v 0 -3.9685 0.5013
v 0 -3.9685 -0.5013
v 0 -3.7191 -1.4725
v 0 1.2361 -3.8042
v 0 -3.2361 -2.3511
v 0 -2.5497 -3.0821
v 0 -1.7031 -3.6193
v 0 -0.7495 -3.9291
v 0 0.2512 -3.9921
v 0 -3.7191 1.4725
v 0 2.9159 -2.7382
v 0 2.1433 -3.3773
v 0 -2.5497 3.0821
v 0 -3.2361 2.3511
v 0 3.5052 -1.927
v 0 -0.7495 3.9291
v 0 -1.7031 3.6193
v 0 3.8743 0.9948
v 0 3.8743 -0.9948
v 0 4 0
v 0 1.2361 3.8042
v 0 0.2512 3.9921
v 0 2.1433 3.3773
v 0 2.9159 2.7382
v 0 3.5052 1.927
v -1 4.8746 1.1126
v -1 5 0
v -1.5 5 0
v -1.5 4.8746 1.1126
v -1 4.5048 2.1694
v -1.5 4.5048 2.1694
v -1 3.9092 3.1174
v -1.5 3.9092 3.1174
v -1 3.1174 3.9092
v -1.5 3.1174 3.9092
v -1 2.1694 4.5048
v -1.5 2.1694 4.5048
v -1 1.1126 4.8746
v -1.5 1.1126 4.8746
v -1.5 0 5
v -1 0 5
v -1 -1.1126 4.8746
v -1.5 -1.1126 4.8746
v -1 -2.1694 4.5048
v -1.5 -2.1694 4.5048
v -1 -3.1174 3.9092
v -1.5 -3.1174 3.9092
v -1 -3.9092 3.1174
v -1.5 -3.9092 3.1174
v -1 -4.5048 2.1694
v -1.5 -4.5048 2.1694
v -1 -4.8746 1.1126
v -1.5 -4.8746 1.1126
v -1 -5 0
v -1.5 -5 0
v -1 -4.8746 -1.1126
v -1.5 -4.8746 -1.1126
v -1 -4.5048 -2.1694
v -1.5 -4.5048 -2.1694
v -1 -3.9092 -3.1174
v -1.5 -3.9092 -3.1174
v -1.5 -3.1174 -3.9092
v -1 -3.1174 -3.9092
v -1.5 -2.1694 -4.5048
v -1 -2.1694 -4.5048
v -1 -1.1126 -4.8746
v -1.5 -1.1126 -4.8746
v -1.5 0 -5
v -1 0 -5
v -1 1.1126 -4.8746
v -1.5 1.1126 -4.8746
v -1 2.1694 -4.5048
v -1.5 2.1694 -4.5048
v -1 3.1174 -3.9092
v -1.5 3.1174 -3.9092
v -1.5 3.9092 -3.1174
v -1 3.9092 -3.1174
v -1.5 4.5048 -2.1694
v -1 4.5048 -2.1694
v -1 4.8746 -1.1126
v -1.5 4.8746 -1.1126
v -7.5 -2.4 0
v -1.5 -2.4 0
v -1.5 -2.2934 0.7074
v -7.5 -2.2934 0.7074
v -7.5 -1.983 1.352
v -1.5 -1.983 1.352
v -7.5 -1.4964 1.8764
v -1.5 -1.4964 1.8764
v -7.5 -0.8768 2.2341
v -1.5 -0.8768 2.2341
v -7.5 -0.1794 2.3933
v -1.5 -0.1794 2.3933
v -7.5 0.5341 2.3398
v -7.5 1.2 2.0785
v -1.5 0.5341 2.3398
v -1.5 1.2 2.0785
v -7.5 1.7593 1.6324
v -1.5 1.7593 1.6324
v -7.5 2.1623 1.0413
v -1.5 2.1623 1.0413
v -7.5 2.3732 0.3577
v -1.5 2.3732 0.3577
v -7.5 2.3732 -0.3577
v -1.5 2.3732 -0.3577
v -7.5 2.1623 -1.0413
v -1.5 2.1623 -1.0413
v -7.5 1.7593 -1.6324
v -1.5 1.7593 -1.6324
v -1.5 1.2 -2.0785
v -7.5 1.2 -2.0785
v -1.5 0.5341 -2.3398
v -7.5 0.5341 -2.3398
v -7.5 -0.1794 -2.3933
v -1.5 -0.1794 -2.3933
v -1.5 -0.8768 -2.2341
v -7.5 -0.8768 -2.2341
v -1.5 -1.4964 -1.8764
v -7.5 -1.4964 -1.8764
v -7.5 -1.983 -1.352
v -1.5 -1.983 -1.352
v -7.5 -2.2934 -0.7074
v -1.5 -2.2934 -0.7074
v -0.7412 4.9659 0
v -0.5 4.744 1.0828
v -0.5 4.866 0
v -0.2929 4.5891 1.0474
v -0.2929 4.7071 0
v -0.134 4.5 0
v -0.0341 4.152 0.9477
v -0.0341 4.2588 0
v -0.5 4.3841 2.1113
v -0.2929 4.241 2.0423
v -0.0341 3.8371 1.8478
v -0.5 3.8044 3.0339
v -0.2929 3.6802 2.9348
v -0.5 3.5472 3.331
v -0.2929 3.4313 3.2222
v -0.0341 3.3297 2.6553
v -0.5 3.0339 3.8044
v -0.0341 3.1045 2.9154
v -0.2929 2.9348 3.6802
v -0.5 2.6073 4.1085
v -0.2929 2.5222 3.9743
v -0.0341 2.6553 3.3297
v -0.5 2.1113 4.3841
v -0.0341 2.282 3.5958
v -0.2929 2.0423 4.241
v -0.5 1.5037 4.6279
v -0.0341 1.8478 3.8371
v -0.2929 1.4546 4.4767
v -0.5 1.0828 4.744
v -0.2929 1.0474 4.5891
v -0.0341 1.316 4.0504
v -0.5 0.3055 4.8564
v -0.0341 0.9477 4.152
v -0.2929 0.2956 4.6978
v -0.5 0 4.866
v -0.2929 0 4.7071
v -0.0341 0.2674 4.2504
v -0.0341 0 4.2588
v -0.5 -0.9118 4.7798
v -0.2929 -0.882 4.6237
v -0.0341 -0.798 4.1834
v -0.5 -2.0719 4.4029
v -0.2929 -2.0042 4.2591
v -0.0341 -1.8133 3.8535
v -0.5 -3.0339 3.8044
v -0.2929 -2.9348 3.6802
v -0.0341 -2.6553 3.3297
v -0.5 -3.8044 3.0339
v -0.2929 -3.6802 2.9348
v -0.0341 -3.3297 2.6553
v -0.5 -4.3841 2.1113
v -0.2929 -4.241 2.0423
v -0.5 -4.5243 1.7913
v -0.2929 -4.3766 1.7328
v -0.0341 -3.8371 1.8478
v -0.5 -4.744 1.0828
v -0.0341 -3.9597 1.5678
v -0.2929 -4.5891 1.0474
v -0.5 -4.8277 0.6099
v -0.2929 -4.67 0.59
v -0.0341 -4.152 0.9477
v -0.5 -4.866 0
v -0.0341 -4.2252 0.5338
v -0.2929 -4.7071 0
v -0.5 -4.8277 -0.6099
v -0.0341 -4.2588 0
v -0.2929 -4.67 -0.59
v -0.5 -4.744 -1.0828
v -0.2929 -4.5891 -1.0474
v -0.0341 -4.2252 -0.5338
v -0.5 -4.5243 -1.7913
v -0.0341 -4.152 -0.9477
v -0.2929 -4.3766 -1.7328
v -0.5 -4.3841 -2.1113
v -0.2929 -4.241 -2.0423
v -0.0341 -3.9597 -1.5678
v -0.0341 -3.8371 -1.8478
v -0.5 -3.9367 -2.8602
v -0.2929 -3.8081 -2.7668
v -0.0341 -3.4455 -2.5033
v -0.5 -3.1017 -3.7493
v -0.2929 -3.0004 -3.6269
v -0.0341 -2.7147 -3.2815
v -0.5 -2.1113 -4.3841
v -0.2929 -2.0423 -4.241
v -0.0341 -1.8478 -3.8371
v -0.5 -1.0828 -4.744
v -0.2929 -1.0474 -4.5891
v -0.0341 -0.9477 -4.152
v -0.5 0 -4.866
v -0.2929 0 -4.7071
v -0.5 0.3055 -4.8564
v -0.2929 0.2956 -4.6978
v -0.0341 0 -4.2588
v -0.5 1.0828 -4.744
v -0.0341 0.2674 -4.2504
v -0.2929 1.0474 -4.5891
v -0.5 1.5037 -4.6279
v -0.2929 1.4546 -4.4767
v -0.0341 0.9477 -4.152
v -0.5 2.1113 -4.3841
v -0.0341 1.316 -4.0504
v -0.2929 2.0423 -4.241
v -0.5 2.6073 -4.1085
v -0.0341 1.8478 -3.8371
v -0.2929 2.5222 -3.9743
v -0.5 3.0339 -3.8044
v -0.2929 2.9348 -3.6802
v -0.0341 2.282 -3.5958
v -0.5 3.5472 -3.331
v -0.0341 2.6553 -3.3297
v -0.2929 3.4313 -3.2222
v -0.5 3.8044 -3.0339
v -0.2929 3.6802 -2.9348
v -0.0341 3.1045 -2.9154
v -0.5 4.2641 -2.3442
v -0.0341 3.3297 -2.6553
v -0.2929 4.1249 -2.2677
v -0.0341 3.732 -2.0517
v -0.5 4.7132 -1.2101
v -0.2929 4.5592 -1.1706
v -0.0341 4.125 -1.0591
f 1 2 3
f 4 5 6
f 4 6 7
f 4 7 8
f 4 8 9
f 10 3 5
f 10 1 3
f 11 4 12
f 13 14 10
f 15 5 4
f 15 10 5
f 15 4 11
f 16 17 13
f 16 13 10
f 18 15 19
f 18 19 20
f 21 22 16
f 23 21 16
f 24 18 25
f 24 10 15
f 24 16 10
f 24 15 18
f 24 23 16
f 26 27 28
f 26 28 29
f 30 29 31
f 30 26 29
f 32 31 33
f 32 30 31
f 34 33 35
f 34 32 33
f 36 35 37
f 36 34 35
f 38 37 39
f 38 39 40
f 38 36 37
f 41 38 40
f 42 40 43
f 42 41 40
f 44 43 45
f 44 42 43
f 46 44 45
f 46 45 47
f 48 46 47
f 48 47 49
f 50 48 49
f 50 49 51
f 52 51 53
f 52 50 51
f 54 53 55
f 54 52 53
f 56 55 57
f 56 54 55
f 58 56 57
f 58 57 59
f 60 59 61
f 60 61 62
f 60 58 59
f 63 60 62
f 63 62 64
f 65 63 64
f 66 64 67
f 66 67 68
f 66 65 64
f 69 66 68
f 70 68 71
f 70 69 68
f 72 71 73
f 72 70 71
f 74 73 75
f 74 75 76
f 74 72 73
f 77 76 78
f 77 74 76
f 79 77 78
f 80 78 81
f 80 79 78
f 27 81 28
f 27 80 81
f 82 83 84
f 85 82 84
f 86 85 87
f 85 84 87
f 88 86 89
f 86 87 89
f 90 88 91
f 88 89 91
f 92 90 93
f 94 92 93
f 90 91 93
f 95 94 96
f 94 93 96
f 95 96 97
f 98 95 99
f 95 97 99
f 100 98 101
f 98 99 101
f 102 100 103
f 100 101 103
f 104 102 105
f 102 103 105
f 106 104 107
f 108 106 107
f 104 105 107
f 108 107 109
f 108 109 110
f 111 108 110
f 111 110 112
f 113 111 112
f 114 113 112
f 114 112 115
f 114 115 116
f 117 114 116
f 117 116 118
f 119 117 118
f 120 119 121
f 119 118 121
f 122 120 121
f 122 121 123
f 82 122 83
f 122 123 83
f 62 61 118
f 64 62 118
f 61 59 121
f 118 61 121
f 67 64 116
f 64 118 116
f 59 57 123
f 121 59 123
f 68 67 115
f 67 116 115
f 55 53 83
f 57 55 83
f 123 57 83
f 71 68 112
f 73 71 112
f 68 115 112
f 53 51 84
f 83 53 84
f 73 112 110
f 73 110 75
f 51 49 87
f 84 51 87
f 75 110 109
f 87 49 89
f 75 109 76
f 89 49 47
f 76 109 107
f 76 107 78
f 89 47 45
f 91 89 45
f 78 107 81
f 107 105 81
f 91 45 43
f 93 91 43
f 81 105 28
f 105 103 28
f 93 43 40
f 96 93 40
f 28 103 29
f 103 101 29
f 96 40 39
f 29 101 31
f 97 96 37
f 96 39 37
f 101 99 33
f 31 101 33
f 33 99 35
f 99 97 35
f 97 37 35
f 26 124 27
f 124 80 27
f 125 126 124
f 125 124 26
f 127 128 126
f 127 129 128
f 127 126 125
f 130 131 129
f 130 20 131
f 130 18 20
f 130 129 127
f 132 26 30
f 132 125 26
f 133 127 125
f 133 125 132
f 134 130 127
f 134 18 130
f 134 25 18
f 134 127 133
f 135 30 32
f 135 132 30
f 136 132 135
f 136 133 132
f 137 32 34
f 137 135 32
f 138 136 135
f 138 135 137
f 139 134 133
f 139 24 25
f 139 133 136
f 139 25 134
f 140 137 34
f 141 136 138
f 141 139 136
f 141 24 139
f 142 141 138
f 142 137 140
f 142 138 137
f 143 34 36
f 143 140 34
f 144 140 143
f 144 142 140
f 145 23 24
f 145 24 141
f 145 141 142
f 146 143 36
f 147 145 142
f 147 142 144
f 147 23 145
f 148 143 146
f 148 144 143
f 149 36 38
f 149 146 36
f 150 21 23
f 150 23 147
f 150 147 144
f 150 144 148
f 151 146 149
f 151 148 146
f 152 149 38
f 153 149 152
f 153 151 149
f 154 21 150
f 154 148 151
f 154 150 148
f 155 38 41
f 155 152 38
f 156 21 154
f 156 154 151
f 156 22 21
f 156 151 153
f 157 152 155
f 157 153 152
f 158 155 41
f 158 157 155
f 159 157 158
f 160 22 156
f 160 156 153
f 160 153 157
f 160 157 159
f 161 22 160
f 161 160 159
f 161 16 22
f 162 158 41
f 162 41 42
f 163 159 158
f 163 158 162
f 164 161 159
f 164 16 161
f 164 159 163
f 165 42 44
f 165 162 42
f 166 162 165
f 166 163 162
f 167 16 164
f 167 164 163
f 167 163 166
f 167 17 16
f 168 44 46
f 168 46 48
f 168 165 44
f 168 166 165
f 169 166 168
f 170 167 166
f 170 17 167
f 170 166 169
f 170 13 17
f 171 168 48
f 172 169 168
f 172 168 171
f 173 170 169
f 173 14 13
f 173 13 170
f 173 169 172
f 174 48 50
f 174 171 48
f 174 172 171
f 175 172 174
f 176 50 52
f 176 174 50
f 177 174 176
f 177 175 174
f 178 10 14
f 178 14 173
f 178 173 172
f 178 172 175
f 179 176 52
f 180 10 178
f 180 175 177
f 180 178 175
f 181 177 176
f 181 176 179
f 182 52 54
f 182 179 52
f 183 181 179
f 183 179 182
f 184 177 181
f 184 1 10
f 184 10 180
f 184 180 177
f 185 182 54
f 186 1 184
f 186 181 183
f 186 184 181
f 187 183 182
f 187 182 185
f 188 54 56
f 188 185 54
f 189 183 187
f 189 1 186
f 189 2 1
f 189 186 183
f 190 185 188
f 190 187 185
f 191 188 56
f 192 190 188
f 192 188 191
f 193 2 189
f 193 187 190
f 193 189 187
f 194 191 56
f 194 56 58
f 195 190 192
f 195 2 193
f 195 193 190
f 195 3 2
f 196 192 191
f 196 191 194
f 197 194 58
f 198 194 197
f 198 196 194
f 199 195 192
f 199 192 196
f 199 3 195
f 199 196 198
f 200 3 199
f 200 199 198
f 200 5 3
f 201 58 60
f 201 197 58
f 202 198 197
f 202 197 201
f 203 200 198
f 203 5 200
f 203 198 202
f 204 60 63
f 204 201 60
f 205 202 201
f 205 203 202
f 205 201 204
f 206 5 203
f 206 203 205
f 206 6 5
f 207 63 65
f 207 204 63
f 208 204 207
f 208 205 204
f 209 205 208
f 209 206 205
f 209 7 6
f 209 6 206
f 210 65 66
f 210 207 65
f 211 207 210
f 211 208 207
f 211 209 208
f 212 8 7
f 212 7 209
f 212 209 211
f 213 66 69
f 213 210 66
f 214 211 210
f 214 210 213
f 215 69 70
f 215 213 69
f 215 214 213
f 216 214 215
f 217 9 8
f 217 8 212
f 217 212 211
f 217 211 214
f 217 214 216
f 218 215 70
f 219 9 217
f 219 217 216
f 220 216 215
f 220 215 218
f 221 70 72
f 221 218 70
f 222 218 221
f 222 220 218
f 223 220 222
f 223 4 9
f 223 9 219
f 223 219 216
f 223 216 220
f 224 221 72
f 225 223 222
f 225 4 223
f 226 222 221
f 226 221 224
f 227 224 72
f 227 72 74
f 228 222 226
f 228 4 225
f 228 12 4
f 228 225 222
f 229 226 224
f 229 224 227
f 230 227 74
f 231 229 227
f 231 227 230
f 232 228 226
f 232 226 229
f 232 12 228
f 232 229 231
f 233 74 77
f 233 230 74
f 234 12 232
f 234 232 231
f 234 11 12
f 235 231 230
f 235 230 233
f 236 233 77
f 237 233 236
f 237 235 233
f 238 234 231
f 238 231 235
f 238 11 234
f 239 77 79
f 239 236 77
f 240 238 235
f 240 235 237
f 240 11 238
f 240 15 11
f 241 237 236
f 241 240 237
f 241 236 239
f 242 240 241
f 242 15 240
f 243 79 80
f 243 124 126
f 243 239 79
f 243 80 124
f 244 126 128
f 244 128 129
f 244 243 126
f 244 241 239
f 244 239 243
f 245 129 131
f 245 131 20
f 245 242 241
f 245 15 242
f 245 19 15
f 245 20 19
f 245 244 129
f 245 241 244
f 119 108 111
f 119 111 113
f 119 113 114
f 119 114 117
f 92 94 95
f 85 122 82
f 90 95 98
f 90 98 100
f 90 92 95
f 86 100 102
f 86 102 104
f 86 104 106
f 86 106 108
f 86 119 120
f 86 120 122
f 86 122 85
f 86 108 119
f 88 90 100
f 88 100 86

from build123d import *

# Parameters (mm, degrees)
F0_R     = 5
F1_DEPTH = 1.5
F2_R     = 1
F3_R     = 2.4
F4_DEPTH = 6


with BuildPart() as f1:
    # F0 (on Right) → F1 (new body)
    with BuildSketch(Plane.YZ):
        Circle(F0_R)
    extrude(amount=-F1_DEPTH)

    # F2
    f2_edges = [f1.edges().sort_by_distance(p)[0] for p in [
        (0, -5, 0),
    ]]
    fillet(f2_edges, radius=F2_R)

    # F3 (on face) → F4 (join)
    with BuildSketch(Plane(origin=(-1.5, 0, 0), x_dir=(0, -1, 0), z_dir=(-1, 0, 0))):
        Circle(F3_R)
    extrude(amount=F4_DEPTH)


solid = f1.part
